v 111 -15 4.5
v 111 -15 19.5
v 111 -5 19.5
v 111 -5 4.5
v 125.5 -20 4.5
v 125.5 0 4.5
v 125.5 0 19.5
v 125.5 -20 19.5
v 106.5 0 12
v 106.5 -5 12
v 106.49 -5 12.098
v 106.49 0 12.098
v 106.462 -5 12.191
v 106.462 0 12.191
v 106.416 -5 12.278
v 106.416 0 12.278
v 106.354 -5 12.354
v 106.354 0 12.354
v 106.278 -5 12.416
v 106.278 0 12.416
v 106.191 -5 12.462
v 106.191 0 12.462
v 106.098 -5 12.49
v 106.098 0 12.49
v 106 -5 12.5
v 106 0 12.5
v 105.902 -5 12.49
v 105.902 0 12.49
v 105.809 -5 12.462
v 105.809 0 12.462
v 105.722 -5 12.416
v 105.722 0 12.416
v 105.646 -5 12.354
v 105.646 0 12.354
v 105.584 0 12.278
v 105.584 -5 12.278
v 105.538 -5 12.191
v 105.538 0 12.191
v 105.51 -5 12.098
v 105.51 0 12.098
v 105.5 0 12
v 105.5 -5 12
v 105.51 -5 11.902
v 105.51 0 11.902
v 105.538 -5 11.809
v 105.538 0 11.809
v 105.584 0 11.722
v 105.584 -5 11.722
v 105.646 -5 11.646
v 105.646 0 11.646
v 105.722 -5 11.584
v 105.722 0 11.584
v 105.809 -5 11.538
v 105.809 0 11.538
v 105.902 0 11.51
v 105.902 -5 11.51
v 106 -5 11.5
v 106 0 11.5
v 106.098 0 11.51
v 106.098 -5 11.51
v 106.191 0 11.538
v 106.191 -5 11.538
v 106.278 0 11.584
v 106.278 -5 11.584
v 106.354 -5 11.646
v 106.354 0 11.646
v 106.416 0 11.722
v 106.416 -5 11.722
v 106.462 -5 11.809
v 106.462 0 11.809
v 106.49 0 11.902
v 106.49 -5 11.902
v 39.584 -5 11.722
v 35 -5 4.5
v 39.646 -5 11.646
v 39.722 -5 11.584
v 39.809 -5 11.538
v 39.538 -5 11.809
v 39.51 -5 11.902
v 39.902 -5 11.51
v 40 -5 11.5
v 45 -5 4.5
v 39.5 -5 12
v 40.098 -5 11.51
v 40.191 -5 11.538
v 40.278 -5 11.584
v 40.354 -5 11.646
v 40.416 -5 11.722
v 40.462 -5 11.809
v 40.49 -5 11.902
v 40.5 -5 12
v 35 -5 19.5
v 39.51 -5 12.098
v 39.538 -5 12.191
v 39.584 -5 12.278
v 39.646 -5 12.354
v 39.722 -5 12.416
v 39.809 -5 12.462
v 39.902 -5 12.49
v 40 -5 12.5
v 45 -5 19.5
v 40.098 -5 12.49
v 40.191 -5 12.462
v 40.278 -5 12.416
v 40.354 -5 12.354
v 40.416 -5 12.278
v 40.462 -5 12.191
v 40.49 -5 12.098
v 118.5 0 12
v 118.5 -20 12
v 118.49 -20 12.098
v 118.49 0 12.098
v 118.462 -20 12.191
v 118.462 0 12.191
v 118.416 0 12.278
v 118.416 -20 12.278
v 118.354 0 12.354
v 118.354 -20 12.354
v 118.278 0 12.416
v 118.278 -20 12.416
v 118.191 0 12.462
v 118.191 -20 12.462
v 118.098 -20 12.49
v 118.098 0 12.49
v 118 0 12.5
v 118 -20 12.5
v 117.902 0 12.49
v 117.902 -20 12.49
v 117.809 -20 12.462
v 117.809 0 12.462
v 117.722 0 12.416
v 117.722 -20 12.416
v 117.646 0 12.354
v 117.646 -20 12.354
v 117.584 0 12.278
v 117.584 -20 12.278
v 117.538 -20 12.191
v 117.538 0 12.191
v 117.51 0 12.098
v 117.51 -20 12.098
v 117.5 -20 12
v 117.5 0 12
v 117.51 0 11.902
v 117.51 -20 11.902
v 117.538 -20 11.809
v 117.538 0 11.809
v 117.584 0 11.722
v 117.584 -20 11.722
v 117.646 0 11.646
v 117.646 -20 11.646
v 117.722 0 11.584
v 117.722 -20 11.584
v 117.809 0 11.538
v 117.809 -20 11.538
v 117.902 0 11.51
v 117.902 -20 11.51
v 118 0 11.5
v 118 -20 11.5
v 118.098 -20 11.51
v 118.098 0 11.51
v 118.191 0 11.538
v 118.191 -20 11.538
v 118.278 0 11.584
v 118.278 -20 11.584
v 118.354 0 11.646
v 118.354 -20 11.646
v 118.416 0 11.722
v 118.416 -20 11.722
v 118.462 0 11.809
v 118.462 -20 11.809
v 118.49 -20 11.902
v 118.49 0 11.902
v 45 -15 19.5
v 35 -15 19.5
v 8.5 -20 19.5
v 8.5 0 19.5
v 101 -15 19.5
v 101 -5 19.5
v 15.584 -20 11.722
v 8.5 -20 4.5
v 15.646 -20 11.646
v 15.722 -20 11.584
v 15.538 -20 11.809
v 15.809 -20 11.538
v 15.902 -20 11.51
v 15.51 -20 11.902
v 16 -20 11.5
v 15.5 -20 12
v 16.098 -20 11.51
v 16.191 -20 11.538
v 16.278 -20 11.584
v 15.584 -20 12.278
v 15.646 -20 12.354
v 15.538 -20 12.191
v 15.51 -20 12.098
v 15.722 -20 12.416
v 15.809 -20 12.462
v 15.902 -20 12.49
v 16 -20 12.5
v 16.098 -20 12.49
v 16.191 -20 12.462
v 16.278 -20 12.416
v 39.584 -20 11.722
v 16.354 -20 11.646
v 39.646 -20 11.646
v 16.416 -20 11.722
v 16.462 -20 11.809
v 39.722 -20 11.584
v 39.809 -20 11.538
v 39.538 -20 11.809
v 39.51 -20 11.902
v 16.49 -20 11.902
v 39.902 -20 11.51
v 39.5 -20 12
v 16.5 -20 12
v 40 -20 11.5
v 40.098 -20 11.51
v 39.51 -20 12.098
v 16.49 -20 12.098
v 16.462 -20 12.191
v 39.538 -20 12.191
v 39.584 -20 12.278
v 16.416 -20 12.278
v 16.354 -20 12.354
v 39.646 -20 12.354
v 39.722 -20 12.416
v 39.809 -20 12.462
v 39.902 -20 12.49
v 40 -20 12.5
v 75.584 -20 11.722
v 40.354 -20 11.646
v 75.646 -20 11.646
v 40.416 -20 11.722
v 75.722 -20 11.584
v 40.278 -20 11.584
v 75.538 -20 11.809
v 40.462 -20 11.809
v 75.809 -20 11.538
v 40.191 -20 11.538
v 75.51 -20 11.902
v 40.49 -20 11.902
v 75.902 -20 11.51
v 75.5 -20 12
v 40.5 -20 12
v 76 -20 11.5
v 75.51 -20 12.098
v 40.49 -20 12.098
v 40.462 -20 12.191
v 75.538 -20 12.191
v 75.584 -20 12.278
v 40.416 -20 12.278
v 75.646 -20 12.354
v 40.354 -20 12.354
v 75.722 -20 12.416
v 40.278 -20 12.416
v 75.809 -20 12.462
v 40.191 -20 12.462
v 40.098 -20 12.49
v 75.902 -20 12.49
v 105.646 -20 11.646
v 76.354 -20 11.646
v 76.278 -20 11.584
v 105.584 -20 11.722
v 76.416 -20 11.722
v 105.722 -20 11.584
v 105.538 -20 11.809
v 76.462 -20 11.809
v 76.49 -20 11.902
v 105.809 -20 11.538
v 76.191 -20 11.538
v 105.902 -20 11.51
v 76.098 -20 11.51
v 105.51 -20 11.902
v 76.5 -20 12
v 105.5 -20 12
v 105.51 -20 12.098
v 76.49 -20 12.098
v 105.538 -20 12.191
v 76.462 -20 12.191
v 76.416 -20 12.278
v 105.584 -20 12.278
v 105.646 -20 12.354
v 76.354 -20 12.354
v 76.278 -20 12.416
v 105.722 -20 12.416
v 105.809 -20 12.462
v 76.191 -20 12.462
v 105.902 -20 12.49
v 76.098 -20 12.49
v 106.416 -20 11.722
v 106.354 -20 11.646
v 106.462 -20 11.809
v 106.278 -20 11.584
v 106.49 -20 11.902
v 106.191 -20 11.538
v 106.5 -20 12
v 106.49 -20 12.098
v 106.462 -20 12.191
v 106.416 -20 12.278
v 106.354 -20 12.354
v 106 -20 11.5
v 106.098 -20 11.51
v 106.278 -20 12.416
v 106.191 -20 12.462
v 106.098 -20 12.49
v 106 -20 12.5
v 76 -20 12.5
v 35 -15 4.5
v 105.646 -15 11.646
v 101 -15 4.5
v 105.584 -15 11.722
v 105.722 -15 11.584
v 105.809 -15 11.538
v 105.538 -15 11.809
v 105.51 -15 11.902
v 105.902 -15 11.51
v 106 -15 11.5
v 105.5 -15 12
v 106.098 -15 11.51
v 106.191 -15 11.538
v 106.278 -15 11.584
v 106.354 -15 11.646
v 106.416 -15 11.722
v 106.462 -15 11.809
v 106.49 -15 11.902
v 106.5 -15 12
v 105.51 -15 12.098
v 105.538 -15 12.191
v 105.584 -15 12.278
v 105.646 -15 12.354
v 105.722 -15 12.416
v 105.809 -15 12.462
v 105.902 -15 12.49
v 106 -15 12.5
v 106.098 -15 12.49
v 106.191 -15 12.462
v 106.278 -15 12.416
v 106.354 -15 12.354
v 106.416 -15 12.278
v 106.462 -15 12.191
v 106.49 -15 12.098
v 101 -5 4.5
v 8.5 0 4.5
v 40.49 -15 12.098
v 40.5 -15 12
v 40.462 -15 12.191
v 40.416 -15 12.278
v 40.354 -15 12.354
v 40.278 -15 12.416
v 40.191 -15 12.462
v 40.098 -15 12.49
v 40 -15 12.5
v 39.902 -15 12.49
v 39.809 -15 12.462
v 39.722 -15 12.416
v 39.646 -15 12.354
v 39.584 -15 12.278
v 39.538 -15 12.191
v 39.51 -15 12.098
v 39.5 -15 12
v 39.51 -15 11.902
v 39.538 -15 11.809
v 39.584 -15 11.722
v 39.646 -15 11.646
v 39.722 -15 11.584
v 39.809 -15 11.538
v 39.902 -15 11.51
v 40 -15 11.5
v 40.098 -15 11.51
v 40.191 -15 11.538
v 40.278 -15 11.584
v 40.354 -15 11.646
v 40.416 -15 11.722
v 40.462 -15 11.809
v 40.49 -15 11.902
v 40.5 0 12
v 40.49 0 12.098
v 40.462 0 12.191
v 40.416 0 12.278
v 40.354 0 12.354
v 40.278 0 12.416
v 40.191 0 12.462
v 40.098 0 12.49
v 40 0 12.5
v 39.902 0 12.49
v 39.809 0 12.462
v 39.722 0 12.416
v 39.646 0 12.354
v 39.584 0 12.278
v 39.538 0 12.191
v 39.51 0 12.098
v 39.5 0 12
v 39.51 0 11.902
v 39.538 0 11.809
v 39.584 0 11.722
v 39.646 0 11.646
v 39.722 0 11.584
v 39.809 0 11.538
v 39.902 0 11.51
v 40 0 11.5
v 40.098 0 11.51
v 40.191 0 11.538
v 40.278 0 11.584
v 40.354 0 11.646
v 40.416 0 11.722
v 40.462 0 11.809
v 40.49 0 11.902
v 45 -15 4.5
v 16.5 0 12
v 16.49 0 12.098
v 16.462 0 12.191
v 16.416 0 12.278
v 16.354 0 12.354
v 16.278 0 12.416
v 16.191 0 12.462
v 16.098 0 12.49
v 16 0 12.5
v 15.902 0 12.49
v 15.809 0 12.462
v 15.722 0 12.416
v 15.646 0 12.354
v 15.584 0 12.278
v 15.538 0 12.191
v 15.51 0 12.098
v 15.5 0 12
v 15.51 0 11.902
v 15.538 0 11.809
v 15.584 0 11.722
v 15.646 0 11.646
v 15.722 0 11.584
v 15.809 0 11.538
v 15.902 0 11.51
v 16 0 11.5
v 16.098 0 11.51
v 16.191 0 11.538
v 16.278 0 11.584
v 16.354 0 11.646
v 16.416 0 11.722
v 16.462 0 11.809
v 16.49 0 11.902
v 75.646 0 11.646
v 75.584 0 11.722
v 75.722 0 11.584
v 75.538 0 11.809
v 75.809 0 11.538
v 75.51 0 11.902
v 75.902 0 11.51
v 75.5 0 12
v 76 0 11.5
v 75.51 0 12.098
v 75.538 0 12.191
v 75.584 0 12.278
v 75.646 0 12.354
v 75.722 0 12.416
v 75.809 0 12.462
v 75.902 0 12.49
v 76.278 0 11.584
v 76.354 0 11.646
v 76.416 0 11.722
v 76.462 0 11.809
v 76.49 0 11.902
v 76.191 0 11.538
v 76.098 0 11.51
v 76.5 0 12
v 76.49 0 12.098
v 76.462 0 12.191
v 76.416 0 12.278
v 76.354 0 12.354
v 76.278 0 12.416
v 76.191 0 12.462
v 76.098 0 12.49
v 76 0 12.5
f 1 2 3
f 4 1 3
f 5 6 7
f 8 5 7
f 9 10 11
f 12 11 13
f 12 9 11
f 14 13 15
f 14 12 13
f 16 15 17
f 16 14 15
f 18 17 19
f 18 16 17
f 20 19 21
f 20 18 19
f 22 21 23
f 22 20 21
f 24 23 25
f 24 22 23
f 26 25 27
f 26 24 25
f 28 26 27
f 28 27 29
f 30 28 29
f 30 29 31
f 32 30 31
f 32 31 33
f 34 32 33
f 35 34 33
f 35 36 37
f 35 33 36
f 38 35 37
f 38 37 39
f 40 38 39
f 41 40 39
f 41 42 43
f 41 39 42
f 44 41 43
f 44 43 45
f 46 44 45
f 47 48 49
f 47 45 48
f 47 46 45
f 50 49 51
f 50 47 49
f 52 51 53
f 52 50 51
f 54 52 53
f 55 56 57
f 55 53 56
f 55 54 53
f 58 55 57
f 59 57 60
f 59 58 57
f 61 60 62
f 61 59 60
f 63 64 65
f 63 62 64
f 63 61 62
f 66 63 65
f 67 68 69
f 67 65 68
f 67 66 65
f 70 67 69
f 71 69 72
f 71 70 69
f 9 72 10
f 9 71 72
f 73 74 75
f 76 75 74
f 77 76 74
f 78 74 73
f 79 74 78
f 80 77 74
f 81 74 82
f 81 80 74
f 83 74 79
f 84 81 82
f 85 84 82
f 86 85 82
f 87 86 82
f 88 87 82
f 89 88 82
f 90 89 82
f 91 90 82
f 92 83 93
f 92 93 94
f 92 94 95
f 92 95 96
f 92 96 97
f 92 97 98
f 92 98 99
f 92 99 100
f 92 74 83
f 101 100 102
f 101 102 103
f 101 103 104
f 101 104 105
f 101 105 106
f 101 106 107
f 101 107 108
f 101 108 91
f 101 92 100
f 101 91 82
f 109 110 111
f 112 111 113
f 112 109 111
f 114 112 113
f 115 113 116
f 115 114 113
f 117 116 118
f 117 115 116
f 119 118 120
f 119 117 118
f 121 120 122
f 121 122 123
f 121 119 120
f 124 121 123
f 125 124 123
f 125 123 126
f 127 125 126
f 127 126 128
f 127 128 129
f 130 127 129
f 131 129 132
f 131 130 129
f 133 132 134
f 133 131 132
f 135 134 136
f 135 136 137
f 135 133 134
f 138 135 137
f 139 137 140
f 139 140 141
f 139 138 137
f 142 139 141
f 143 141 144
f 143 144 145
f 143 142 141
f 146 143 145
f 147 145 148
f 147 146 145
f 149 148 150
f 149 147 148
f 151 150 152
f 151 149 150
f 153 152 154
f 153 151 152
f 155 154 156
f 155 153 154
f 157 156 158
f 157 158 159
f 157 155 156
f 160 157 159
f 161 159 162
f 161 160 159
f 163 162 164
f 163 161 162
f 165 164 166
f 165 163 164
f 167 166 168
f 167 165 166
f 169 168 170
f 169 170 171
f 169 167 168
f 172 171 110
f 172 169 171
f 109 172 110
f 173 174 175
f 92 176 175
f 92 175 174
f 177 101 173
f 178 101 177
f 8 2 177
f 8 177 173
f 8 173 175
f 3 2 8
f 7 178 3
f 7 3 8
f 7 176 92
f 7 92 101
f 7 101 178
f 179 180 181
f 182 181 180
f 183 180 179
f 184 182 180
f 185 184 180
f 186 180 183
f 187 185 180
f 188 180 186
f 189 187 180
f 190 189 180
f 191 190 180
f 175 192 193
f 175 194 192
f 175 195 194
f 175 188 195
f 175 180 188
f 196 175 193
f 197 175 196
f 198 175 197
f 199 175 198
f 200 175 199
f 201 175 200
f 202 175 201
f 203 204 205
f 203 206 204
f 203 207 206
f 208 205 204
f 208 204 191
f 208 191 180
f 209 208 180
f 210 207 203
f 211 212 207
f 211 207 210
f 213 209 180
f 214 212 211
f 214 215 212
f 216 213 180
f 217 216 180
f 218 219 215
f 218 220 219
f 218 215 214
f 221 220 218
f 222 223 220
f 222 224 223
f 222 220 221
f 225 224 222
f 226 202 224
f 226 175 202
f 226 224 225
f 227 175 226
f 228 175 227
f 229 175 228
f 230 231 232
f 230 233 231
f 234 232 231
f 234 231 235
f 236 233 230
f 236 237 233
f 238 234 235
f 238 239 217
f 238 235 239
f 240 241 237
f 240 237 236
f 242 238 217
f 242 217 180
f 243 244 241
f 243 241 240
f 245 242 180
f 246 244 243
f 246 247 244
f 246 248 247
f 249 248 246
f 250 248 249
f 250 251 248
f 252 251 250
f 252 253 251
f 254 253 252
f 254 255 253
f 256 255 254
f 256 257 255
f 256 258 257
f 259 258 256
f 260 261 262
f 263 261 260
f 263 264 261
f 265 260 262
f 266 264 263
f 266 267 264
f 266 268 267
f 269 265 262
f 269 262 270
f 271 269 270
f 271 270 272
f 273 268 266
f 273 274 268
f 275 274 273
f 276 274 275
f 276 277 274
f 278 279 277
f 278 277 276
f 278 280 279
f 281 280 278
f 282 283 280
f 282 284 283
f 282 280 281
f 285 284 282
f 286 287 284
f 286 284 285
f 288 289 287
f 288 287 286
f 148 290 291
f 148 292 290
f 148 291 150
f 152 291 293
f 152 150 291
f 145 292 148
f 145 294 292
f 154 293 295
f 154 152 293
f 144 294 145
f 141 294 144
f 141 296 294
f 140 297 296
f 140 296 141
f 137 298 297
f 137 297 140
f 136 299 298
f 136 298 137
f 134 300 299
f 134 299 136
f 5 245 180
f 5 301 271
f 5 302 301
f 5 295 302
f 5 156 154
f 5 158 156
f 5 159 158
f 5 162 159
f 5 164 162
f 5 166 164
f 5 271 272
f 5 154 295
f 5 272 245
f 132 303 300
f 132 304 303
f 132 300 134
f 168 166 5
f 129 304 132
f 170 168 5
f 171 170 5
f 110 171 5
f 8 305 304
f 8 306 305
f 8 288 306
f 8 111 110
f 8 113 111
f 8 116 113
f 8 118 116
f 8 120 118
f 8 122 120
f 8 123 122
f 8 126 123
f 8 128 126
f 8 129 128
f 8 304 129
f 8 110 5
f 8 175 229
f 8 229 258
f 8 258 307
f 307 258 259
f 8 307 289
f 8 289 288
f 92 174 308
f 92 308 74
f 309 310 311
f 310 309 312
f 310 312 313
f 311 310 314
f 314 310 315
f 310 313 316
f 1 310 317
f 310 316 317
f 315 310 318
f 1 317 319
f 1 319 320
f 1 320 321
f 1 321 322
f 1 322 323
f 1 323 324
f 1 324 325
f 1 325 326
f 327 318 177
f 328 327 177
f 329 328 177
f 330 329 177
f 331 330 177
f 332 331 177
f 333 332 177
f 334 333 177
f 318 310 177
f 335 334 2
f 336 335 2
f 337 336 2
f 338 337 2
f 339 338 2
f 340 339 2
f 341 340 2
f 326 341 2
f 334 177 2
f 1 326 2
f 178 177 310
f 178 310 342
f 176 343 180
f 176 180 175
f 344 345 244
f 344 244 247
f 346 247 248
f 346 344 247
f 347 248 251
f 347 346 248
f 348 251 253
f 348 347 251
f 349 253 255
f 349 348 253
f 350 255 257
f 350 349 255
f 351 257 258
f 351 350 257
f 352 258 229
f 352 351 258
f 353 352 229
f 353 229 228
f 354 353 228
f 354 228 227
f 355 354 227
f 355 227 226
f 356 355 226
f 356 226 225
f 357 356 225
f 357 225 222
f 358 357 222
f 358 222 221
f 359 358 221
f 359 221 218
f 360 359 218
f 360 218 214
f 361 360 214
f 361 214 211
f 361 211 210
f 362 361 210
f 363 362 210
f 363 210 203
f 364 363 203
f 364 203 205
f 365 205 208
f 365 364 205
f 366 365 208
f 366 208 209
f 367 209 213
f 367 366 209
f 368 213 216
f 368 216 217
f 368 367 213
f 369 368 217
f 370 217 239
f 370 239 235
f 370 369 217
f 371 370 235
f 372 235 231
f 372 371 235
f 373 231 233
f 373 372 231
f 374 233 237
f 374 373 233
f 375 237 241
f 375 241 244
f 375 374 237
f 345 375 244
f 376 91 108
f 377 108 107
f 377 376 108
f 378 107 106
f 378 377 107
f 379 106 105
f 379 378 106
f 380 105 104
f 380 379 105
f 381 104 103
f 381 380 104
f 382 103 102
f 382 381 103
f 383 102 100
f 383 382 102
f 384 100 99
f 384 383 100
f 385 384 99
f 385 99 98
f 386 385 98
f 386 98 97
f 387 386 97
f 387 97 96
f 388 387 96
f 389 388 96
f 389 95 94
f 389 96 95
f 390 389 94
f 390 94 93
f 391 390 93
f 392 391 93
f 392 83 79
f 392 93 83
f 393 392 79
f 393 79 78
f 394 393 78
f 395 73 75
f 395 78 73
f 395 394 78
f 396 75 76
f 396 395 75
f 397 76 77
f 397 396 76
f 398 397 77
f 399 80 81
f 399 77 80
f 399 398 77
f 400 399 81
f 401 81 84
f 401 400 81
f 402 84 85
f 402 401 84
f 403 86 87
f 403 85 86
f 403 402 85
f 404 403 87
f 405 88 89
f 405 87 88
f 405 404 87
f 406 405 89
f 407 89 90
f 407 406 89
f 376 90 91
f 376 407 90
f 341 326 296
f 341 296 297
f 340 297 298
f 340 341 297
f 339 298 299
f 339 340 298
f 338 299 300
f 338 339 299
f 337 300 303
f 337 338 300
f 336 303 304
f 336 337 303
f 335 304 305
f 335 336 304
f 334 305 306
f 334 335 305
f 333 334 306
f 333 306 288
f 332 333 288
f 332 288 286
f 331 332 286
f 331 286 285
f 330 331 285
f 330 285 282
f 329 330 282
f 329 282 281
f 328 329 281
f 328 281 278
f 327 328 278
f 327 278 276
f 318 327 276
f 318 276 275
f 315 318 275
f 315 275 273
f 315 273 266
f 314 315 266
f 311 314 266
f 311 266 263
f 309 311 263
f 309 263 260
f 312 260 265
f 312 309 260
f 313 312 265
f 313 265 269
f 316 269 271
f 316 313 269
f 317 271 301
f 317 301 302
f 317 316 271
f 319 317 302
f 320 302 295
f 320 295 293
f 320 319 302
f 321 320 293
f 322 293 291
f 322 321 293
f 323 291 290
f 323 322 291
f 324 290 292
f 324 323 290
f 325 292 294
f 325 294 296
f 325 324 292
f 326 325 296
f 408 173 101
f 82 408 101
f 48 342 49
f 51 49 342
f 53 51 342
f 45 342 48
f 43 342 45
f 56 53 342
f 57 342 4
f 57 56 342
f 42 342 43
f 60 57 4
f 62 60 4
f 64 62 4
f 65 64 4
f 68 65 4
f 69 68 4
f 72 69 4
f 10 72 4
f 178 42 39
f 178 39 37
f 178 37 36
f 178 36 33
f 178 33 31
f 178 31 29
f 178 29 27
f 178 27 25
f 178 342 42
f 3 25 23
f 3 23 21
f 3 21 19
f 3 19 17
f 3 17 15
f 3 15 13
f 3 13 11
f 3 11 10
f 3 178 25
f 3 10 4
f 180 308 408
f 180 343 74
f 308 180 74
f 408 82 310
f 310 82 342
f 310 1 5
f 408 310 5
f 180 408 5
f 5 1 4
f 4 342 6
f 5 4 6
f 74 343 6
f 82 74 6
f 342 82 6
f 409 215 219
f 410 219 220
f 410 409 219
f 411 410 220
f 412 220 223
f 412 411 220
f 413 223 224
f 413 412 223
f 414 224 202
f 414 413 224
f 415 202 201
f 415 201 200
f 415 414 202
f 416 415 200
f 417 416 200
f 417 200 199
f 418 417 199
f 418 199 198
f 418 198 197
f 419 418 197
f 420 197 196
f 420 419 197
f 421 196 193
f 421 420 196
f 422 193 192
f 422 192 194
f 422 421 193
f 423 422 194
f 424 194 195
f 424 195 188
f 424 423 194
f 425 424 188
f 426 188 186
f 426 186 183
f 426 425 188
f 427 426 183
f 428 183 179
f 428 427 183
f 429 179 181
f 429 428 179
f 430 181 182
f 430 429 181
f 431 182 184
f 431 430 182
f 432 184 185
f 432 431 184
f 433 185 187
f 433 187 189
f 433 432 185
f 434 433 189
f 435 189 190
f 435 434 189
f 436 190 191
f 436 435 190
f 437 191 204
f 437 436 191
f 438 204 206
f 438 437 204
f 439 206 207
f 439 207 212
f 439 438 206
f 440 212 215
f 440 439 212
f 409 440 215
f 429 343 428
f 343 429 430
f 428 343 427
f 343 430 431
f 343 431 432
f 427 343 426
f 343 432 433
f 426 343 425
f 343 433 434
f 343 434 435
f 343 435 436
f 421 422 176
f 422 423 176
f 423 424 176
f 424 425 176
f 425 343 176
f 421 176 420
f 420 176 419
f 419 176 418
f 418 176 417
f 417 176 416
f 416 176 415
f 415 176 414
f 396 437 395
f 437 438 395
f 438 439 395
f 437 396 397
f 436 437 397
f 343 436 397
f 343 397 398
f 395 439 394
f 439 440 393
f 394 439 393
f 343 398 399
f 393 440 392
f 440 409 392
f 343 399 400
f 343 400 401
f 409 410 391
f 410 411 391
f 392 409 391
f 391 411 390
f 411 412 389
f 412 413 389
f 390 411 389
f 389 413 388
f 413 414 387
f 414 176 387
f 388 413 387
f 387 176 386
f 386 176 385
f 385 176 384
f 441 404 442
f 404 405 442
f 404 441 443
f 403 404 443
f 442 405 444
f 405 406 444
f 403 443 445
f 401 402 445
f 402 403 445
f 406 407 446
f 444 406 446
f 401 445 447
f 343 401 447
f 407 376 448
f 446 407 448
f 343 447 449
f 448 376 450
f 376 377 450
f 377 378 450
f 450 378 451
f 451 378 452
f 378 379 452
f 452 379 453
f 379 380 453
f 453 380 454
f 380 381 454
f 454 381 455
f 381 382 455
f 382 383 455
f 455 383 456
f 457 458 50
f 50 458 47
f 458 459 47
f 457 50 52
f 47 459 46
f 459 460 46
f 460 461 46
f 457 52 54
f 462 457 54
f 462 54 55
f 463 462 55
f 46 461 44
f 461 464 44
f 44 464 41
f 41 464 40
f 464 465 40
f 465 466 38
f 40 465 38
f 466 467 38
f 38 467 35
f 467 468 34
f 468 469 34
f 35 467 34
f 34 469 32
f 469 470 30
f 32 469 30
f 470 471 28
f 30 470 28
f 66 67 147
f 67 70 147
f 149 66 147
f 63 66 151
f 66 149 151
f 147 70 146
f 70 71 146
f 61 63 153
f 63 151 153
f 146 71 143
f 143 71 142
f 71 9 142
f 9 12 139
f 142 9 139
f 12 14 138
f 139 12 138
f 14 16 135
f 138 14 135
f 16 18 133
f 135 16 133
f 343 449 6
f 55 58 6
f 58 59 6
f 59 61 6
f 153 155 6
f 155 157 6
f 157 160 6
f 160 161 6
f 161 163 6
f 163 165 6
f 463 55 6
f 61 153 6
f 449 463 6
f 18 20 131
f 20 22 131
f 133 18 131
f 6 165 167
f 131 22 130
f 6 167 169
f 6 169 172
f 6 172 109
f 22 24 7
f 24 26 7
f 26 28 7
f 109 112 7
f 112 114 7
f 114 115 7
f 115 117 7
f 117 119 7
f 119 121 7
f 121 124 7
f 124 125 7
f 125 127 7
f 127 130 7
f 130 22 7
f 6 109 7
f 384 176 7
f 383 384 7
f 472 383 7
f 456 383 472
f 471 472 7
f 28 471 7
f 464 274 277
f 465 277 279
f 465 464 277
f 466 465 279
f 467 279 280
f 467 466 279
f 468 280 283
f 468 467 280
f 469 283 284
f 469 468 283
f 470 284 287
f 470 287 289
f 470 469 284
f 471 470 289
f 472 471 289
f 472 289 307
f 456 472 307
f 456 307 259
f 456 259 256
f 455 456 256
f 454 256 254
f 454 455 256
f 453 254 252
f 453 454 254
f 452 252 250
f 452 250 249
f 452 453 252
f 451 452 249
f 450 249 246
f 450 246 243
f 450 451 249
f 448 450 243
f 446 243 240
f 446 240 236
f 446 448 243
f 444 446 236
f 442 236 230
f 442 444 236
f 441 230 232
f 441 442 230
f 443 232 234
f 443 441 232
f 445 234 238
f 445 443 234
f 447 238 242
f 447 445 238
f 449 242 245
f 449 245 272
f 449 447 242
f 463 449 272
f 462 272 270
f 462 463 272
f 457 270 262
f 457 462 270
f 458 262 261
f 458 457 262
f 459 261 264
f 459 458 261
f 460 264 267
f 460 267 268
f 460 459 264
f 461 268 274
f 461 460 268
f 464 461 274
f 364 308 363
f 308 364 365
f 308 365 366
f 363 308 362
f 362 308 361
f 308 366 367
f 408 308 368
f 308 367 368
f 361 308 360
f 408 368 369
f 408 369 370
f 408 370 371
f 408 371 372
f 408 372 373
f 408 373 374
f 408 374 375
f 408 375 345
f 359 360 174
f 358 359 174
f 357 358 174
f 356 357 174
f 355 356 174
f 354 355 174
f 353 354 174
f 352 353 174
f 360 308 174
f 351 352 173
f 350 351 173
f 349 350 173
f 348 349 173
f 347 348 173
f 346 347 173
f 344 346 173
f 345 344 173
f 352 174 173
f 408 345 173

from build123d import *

# Parameters (mm, degrees)
F0_W     = 117
F0_H     = 15
F0_R     = 0.5
F1_DEPTH = 20
F2_W     = 10
F2_H     = 10
F3_DEPTH = 37


with BuildPart() as f1:
    # F0 (on Front) → F1 (new body)
    with BuildSketch(Plane.XZ):
        with Locations((67, 12)):
            Rectangle(F0_W, F0_H)
        with Locations((16, 12)):
            Circle(F0_R, mode=Mode.SUBTRACT)
        with Locations((40, 12)):
            Circle(F0_R, mode=Mode.SUBTRACT)
        with Locations((76, 12)):
            Circle(F0_R, mode=Mode.SUBTRACT)
        with Locations((106, 12)):
            Circle(F0_R, mode=Mode.SUBTRACT)
        with Locations((118, 12)):
            Circle(F0_R, mode=Mode.SUBTRACT)
    extrude(amount=F1_DEPTH)

    # F2 (on face) → F3 (cut)
    with BuildSketch(Plane.XY.offset(19.5)):
        with Locations((40, -10)):
            Rectangle(F2_W, F2_H)
        with Locations((106, -10)):
            Rectangle(F2_W, F2_H)
    extrude(amount=-F3_DEPTH, mode=Mode.SUBTRACT)


solid = f1.part
